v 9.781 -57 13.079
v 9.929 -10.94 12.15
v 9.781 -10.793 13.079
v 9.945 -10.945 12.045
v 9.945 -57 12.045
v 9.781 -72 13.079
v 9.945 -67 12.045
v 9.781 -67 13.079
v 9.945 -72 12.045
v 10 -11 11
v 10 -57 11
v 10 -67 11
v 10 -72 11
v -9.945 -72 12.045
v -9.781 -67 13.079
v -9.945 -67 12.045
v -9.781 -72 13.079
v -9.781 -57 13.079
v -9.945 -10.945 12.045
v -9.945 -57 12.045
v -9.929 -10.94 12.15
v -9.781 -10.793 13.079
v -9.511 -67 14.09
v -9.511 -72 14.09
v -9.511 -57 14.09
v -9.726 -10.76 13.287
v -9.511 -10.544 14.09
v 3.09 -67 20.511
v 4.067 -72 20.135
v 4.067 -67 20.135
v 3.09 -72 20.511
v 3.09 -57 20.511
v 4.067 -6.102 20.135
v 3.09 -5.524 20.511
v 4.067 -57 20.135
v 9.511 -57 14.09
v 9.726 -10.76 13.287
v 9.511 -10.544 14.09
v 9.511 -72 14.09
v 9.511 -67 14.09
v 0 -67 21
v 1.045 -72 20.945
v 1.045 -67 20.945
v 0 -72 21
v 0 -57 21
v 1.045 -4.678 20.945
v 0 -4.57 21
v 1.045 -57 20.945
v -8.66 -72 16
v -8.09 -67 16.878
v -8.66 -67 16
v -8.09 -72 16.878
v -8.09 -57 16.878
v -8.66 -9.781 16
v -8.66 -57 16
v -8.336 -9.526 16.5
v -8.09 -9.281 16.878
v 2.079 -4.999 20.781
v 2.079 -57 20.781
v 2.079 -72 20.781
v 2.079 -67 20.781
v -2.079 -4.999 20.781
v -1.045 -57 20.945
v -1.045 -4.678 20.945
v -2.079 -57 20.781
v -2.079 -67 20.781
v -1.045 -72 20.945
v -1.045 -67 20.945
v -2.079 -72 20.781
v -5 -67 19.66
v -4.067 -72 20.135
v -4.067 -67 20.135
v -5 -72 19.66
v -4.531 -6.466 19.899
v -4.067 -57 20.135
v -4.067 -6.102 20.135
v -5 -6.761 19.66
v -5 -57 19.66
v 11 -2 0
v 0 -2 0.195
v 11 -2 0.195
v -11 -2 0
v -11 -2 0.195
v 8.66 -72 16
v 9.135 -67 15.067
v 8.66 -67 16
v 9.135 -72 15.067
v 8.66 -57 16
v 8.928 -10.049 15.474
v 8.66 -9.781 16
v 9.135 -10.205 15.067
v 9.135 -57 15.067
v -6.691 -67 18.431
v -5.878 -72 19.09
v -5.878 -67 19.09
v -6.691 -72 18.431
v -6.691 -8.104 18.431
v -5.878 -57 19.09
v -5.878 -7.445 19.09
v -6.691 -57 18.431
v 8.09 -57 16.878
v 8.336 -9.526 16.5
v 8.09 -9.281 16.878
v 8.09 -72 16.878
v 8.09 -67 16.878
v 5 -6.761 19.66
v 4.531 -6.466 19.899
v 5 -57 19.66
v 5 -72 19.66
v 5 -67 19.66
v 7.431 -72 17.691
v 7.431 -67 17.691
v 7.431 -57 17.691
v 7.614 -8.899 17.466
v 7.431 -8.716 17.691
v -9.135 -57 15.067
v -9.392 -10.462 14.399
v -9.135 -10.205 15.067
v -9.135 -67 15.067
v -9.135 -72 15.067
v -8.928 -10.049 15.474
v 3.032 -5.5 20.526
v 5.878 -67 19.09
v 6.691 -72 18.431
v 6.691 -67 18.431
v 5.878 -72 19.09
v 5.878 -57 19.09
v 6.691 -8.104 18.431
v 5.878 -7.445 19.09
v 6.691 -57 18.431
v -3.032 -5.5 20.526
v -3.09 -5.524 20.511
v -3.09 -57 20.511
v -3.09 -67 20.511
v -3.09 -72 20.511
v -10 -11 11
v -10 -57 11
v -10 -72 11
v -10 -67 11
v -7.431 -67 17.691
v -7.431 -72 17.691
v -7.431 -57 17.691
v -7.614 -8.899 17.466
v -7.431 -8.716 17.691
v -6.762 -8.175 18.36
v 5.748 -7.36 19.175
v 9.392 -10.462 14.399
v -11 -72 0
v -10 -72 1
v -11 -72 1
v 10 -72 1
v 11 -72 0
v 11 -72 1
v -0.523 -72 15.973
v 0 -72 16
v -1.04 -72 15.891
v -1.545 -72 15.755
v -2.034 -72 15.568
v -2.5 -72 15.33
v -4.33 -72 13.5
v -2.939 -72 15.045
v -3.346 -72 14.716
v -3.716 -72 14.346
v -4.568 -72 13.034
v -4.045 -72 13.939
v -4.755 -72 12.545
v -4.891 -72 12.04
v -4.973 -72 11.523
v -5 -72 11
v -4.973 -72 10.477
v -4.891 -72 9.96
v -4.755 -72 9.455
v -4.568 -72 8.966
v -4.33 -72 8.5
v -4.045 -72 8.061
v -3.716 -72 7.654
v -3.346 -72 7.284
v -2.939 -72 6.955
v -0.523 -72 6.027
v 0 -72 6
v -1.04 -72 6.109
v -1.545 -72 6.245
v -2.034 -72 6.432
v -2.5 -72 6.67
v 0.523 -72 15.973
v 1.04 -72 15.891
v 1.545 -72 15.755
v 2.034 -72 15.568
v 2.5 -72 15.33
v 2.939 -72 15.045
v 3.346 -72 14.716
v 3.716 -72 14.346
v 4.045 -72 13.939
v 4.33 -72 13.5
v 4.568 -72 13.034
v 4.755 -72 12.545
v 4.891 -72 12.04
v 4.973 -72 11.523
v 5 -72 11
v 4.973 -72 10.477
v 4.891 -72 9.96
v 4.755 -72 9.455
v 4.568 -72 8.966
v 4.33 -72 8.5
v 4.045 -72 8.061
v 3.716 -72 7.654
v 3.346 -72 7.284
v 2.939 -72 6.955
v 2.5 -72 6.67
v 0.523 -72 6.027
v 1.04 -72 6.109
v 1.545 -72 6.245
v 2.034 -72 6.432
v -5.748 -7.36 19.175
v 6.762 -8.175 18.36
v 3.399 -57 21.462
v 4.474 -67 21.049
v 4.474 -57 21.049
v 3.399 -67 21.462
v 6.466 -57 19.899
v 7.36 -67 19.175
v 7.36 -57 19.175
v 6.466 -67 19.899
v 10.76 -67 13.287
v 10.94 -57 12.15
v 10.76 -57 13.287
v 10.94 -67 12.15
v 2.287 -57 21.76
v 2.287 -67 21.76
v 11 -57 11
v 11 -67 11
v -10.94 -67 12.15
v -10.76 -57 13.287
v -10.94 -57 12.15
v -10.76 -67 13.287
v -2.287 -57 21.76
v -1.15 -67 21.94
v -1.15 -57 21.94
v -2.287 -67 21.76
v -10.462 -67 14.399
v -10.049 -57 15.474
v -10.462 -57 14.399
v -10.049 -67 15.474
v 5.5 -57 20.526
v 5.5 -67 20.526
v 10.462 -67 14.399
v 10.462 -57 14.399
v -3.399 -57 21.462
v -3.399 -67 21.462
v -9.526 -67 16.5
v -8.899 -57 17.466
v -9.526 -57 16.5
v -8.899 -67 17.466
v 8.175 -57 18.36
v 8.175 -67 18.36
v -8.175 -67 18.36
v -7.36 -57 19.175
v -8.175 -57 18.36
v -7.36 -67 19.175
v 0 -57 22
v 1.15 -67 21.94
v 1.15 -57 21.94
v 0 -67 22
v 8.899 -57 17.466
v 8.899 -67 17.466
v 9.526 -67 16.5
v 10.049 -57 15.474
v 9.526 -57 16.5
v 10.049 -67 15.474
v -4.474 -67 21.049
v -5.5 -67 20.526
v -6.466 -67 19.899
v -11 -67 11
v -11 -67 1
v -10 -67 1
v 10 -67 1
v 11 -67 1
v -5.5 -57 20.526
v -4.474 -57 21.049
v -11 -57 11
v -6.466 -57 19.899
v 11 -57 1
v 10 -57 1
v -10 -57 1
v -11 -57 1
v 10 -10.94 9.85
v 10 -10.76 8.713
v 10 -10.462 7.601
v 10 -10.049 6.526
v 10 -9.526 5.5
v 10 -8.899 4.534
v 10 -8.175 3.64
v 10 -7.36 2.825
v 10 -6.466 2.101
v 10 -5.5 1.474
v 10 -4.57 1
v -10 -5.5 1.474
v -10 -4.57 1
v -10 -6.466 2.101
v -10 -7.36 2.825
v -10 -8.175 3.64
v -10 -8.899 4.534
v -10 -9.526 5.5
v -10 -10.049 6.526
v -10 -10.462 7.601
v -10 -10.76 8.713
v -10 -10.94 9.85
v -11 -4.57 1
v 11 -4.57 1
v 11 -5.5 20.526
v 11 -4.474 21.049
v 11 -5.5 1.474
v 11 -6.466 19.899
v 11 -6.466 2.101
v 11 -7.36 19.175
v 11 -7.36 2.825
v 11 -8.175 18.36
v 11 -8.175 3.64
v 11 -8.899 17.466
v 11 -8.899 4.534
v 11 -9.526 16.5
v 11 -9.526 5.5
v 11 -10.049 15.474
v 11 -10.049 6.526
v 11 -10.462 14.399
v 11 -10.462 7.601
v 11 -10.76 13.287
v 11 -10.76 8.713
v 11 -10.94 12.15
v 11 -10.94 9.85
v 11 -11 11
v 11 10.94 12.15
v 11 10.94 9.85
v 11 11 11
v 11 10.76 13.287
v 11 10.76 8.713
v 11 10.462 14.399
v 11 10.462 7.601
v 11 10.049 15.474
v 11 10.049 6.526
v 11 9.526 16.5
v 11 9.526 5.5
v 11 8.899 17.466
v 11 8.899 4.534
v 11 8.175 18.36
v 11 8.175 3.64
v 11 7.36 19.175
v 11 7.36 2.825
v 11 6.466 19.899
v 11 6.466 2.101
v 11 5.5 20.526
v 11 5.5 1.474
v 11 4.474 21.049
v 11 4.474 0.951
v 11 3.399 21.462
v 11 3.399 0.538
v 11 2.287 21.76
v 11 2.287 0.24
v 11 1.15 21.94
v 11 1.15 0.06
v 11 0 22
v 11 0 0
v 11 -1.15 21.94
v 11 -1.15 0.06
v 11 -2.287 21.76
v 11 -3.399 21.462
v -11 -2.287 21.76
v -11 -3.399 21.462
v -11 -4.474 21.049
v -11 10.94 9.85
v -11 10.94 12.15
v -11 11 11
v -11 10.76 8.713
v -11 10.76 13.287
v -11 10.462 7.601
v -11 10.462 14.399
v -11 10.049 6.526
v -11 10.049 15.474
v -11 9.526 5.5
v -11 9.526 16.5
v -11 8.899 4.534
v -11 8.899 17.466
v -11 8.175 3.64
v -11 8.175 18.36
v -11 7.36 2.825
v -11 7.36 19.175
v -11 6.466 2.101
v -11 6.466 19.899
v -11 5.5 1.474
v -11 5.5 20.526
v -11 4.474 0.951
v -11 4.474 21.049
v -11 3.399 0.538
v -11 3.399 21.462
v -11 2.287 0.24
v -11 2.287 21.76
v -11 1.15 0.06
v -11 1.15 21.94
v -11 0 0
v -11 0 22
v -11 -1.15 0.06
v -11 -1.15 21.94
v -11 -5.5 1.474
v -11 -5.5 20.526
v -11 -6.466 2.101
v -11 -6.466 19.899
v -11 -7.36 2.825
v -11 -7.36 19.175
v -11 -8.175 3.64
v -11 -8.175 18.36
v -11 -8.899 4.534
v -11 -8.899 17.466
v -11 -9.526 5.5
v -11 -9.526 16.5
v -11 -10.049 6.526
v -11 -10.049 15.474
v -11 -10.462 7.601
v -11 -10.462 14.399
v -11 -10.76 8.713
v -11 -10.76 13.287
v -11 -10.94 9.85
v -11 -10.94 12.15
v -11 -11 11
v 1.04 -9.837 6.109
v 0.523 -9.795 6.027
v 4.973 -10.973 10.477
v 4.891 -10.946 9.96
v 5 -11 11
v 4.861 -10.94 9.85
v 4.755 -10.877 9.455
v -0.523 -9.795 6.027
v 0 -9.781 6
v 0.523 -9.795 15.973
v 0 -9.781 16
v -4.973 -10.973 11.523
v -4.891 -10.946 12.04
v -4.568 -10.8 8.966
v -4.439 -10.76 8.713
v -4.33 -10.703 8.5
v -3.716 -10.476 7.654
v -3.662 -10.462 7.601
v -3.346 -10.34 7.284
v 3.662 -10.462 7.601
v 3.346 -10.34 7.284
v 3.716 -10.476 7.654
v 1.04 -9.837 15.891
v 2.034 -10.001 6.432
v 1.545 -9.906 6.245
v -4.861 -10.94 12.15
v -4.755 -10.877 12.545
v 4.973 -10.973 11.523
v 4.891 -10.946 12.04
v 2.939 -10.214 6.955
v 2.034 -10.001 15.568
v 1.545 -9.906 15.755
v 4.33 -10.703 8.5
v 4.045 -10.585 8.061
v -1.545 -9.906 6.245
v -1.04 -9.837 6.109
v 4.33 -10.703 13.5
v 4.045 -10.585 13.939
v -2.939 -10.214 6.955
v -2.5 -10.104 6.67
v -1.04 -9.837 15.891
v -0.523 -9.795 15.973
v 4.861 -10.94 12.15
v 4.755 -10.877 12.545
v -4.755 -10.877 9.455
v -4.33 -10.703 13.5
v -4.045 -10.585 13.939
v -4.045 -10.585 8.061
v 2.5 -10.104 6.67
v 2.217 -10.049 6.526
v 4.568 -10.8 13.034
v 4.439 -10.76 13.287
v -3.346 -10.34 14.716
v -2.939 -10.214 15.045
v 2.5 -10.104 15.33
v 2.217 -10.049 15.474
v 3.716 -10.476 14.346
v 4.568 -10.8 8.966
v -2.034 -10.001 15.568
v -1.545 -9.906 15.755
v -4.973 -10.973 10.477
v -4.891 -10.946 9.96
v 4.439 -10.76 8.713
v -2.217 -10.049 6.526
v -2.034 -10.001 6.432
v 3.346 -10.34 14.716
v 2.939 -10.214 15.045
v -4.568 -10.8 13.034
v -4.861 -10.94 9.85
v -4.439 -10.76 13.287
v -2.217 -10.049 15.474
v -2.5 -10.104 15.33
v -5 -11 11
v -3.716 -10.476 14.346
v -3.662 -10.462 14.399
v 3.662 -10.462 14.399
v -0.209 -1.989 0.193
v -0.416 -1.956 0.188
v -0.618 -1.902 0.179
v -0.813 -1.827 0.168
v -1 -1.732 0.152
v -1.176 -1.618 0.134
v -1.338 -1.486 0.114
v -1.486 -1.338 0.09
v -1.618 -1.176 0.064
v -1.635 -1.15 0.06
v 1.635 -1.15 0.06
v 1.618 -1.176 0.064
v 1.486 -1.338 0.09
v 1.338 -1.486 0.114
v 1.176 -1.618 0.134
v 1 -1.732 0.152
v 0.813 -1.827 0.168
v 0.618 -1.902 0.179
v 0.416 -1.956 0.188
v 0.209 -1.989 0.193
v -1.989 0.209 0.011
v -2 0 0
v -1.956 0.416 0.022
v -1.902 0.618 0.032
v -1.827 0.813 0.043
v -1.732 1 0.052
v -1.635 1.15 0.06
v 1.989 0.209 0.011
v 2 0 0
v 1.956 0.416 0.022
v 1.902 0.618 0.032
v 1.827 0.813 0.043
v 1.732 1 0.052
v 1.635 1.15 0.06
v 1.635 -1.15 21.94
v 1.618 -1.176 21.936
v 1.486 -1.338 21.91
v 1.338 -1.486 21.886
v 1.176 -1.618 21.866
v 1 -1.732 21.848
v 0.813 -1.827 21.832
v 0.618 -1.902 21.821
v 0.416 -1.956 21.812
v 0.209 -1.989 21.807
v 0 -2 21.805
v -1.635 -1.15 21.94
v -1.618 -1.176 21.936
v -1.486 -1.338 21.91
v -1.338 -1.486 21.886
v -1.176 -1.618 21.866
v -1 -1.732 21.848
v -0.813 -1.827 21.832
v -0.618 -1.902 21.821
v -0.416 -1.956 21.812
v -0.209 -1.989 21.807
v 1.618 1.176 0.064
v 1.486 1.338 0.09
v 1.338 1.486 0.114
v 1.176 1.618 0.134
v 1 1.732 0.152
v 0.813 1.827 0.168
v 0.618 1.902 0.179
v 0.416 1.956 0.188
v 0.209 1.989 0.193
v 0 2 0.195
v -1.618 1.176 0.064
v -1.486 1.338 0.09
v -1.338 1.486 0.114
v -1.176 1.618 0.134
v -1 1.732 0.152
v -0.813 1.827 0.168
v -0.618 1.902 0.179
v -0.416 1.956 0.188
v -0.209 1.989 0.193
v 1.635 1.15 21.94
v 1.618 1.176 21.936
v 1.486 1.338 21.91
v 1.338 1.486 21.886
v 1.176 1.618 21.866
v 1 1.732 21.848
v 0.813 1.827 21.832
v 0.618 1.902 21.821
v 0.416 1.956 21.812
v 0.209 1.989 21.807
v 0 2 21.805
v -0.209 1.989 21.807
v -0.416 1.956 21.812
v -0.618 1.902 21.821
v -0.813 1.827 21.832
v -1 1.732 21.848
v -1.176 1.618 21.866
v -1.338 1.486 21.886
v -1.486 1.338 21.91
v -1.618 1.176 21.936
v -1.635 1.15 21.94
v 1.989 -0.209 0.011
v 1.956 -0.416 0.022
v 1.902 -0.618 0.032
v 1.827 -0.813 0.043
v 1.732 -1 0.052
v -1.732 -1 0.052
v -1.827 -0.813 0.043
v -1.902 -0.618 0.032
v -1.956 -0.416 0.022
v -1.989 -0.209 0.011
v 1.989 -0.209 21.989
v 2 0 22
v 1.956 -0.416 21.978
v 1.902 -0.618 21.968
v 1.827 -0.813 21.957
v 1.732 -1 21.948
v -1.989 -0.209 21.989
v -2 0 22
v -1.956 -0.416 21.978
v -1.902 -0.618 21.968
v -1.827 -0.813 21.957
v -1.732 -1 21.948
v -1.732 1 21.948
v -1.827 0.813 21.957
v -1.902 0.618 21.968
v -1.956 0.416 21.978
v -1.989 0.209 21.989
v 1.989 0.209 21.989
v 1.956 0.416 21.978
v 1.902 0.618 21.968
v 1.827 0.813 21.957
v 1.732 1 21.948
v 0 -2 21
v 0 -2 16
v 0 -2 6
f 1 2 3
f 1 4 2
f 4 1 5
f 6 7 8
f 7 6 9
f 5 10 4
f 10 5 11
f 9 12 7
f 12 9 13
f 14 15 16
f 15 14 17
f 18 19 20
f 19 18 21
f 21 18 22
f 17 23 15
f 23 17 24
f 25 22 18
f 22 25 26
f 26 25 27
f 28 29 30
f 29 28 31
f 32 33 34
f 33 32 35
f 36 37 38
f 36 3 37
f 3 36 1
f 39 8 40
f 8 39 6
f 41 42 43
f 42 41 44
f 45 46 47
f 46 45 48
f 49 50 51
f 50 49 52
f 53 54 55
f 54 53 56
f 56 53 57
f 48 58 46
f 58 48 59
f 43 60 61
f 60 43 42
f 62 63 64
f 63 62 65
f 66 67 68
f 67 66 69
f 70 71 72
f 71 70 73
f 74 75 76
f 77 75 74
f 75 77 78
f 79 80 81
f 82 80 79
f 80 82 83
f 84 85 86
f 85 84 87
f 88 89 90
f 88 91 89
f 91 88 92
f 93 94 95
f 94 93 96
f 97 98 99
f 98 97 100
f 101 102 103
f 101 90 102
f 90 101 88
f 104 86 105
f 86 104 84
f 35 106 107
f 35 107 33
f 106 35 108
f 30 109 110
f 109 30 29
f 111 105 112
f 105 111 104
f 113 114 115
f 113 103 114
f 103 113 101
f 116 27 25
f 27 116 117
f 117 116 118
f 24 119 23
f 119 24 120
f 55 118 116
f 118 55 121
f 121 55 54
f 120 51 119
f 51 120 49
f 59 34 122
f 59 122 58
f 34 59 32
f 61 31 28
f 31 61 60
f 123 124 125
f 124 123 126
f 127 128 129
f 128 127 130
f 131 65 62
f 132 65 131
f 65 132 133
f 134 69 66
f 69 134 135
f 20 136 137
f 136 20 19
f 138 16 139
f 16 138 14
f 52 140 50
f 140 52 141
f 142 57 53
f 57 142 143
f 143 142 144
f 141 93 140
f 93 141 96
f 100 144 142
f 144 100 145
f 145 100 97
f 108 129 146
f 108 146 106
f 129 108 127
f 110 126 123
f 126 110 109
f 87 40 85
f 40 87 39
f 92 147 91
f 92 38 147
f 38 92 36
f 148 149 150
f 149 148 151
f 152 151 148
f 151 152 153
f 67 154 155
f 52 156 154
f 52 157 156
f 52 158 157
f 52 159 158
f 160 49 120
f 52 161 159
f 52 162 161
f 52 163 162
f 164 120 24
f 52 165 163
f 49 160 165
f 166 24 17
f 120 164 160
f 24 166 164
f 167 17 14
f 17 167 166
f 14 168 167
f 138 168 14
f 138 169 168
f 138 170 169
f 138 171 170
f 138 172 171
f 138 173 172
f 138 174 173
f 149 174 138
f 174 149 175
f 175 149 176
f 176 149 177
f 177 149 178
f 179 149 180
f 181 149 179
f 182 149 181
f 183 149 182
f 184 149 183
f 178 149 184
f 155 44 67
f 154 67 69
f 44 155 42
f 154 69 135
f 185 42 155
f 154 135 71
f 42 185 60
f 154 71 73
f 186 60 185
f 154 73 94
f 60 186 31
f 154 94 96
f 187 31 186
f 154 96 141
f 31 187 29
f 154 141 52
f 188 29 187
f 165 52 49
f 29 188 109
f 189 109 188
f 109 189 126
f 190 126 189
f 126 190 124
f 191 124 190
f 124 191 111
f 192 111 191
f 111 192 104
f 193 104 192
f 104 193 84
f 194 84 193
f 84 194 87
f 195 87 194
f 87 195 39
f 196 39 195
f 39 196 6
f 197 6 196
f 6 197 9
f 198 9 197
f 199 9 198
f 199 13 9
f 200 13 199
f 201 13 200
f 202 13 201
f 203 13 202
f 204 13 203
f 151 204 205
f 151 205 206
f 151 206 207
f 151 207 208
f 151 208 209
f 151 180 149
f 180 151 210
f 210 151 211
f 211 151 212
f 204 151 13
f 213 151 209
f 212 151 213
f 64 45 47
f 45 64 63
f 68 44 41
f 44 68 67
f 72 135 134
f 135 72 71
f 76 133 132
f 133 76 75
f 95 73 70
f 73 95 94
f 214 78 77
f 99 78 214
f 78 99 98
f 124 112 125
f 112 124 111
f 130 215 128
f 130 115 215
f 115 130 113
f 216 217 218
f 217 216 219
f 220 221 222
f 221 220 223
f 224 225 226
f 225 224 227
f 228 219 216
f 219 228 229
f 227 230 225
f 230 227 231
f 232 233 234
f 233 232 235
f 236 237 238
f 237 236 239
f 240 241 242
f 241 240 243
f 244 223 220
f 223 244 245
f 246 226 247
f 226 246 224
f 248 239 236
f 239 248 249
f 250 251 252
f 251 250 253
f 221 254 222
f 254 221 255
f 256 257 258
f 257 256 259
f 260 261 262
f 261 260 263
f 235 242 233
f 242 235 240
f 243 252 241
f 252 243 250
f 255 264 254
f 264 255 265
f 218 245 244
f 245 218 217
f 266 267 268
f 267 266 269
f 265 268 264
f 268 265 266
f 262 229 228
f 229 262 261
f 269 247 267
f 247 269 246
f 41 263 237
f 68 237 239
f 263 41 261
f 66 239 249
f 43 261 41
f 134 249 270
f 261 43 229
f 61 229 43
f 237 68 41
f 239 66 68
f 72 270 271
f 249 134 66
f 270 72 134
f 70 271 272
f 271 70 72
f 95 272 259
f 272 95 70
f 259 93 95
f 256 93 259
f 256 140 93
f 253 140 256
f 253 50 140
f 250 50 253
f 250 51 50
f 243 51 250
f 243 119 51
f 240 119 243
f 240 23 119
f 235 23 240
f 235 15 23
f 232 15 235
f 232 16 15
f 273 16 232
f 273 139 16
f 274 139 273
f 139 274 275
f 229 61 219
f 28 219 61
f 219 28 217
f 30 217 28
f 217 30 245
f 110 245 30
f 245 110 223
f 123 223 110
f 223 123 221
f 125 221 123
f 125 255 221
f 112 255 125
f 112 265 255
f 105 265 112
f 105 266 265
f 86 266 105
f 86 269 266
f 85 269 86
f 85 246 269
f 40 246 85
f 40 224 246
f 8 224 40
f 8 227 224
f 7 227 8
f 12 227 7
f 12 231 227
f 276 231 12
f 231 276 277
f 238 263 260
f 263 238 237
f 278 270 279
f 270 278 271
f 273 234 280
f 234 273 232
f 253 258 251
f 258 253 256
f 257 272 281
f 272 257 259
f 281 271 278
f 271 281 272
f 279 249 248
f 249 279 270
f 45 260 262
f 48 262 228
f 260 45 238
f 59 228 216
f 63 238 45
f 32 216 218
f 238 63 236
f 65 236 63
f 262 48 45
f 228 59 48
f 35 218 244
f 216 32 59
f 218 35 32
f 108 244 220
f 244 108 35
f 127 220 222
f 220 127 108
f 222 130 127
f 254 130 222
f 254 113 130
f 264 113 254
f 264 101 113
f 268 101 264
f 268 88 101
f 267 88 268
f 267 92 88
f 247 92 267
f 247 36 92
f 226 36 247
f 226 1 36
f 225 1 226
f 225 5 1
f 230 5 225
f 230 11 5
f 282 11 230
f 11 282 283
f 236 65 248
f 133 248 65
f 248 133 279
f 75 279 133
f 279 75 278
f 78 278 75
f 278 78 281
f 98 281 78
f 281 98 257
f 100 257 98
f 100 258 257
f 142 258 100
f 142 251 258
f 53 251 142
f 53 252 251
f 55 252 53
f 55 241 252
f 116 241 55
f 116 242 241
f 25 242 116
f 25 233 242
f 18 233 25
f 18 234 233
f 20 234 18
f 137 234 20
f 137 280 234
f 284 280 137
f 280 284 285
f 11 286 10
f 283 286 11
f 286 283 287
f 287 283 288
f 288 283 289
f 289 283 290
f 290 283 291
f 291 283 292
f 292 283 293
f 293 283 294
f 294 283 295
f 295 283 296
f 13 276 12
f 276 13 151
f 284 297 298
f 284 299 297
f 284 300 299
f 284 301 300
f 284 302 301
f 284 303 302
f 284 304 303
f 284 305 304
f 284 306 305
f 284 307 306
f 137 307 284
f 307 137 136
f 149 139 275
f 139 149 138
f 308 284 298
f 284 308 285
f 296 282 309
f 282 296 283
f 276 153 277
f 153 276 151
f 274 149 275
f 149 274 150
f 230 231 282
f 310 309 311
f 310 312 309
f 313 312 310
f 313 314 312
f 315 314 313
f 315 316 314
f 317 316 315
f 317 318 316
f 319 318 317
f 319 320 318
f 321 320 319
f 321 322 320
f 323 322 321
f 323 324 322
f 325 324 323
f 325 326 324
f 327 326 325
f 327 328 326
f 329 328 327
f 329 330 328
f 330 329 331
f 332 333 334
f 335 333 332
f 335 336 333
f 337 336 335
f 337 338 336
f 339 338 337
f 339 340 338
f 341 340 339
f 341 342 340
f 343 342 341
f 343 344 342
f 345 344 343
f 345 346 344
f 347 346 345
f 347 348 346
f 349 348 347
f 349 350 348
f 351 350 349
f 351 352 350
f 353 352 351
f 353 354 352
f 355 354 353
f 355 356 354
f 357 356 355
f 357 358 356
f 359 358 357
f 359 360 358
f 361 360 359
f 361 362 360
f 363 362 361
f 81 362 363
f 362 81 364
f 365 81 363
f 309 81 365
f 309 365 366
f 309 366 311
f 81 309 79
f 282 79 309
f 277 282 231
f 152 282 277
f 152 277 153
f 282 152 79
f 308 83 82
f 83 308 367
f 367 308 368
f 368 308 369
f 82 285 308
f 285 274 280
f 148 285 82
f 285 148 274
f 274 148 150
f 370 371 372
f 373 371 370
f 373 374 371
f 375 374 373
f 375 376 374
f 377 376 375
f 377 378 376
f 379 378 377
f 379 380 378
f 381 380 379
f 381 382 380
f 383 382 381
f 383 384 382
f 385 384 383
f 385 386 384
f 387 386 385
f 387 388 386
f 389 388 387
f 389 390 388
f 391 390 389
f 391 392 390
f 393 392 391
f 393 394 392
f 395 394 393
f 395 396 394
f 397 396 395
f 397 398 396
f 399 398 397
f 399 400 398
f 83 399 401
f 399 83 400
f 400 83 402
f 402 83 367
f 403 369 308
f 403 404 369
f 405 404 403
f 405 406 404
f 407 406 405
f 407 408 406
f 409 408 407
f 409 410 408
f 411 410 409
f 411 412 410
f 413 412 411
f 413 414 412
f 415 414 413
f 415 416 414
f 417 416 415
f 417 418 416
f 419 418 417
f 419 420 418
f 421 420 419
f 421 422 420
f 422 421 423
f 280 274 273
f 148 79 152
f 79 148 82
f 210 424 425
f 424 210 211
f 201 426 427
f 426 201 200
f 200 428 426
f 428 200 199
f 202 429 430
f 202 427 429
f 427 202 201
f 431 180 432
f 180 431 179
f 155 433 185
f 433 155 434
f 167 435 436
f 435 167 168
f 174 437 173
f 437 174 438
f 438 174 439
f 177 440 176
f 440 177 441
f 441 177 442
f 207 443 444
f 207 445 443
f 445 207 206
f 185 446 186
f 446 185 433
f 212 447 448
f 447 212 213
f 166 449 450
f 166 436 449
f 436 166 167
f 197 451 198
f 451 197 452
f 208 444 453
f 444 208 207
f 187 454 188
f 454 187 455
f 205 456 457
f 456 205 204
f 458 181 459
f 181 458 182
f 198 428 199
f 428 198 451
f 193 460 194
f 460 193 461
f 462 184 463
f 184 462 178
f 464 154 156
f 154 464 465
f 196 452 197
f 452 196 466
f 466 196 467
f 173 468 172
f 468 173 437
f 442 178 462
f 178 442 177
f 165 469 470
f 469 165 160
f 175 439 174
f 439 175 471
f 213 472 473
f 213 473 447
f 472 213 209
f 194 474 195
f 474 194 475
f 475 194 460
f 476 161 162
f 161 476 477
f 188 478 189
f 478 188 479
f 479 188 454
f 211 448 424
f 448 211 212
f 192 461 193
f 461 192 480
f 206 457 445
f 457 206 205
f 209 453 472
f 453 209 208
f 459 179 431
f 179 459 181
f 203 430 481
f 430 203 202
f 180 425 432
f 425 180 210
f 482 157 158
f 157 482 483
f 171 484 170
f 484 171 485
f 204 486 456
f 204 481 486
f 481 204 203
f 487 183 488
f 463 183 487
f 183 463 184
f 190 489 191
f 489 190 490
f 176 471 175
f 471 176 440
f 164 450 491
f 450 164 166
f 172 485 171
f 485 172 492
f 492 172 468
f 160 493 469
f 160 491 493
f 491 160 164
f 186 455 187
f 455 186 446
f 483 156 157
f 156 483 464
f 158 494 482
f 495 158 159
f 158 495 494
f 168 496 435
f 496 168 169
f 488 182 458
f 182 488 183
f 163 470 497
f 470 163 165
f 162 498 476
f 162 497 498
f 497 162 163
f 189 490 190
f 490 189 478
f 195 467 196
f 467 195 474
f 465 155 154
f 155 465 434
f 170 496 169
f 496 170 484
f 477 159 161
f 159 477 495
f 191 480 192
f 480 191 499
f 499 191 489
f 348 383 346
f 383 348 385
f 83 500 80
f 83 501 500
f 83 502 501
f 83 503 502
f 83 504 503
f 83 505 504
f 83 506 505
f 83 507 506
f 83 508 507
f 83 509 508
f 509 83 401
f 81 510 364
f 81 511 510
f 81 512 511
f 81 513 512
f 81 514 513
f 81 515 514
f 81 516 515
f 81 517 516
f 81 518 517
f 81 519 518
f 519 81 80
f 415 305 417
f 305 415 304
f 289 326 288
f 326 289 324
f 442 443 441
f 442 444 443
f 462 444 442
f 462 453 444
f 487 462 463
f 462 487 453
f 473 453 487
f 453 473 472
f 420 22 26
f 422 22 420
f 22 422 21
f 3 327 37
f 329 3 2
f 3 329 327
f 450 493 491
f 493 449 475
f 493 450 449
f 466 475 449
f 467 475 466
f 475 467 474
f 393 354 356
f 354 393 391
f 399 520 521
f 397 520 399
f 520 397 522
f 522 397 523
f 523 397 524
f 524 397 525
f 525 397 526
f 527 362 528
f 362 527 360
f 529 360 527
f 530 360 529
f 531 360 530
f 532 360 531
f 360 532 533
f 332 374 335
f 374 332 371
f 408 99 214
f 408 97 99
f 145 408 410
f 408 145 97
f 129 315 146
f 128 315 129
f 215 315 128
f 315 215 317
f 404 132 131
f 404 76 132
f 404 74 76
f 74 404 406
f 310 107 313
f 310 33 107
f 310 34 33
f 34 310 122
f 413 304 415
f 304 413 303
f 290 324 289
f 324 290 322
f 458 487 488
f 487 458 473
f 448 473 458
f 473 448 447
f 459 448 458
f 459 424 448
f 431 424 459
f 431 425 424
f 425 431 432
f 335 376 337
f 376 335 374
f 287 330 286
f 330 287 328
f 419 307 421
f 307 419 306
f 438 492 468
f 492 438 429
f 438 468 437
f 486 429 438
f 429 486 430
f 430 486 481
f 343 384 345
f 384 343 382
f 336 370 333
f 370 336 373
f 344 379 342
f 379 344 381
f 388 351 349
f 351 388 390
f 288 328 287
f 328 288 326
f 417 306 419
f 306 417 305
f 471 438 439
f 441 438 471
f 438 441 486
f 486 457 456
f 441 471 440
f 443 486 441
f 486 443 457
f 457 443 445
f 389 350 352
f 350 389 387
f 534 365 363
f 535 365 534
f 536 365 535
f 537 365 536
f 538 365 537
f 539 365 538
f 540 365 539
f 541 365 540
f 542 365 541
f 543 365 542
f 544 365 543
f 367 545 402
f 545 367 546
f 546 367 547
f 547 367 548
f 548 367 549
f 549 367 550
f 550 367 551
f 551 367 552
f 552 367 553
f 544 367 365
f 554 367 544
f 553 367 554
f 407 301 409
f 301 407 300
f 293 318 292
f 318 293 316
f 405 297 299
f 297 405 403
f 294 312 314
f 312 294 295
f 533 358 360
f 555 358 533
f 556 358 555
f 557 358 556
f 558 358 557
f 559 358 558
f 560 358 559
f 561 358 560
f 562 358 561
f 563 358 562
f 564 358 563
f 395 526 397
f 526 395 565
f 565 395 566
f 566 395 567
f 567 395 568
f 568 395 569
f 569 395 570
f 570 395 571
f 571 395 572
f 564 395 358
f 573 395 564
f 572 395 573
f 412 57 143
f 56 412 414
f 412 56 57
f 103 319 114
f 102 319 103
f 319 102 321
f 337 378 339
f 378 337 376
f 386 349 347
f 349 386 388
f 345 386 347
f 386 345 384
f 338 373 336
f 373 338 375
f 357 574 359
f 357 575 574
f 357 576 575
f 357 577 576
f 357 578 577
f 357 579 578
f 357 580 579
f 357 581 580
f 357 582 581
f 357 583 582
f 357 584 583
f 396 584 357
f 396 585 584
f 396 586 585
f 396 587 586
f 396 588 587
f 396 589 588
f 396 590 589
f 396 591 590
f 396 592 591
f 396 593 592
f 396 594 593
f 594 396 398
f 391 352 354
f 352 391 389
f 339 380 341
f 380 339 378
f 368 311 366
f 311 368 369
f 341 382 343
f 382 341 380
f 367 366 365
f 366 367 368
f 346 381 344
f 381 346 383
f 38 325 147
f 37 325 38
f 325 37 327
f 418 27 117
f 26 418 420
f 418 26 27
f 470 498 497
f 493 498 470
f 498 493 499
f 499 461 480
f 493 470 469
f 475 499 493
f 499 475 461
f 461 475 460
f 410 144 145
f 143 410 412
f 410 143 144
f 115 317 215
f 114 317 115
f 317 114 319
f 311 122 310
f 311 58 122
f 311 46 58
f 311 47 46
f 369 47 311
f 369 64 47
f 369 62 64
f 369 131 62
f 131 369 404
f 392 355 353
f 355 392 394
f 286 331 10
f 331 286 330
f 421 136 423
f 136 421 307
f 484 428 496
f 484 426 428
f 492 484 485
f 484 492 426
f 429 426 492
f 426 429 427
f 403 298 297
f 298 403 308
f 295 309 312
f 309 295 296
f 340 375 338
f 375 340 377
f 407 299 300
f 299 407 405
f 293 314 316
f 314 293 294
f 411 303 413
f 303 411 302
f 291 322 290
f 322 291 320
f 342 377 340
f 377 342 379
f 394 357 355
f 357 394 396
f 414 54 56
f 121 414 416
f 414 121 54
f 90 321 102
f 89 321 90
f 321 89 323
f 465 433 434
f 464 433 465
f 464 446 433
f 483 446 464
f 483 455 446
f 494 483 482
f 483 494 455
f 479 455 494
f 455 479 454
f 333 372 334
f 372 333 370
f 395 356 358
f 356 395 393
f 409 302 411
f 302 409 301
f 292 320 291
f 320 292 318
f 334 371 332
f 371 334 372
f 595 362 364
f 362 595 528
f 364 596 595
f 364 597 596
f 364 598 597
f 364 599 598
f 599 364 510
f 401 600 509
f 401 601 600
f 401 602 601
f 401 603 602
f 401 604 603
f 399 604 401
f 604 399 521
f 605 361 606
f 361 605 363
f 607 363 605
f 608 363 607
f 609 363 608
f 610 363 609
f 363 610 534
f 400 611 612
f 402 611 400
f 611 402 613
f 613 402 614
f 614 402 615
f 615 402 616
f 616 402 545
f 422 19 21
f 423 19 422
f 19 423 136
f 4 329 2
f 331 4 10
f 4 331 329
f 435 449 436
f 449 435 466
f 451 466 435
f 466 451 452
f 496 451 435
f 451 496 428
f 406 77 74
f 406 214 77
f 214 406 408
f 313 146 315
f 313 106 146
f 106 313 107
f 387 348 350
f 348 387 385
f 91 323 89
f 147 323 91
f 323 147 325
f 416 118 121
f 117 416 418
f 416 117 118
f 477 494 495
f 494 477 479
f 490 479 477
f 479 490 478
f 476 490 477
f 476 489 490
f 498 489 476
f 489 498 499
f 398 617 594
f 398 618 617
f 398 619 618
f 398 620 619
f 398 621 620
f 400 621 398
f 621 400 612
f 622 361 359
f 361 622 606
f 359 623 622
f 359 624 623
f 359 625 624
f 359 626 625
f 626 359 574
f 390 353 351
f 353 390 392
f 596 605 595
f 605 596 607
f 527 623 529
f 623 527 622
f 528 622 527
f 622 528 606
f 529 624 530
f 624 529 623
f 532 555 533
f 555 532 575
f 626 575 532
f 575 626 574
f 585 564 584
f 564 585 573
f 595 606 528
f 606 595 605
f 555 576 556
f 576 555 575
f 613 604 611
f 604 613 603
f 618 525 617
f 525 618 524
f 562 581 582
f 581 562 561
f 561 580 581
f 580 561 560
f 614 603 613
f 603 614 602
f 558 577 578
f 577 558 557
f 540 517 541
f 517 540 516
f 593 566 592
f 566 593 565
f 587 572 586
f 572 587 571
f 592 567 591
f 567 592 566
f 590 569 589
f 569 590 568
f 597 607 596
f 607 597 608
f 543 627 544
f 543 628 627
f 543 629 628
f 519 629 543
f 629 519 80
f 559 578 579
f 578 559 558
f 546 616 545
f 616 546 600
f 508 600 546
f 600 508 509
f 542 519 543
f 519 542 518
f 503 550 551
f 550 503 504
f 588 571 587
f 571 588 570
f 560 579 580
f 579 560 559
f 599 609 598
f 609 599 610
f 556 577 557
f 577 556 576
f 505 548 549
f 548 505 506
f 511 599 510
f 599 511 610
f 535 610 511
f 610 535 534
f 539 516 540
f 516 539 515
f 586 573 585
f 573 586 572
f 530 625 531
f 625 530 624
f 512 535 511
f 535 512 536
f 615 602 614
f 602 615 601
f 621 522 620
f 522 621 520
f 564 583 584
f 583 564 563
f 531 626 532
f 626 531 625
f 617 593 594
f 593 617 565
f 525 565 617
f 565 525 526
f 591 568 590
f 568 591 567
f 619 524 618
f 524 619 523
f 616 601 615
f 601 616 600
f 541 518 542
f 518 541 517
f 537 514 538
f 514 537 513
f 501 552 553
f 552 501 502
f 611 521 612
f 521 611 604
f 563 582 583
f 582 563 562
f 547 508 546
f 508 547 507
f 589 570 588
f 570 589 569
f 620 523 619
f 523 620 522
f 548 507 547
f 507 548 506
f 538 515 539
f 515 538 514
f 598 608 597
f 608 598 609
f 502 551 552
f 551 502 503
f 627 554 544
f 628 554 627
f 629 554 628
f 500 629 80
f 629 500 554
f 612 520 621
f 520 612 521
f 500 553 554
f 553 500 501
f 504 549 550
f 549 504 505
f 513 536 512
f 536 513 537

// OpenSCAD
$fn=60;

translate([0,-72,11])rotate([-90,0,0])
difference(){
      
union(){
translate([0,0,0])cylinder(d=20,h=70);
translate([0,0,5])cylinder(d=22,h=10);
translate([-10,0,0])cube([20,10,70]);
translate([-11,0,5])cube([22,10,10]);
translate([-11,10,0])cube([22,1,70]);
}

cylinder(d=10,h=70);
}


difference(){
translate([-11,0,11])rotate([0,90,0])
cylinder(d=22,h=22);
cylinder(d=4,h=22);
}
    
//https://www.figures.com/forums/showthread.php?t=14656
